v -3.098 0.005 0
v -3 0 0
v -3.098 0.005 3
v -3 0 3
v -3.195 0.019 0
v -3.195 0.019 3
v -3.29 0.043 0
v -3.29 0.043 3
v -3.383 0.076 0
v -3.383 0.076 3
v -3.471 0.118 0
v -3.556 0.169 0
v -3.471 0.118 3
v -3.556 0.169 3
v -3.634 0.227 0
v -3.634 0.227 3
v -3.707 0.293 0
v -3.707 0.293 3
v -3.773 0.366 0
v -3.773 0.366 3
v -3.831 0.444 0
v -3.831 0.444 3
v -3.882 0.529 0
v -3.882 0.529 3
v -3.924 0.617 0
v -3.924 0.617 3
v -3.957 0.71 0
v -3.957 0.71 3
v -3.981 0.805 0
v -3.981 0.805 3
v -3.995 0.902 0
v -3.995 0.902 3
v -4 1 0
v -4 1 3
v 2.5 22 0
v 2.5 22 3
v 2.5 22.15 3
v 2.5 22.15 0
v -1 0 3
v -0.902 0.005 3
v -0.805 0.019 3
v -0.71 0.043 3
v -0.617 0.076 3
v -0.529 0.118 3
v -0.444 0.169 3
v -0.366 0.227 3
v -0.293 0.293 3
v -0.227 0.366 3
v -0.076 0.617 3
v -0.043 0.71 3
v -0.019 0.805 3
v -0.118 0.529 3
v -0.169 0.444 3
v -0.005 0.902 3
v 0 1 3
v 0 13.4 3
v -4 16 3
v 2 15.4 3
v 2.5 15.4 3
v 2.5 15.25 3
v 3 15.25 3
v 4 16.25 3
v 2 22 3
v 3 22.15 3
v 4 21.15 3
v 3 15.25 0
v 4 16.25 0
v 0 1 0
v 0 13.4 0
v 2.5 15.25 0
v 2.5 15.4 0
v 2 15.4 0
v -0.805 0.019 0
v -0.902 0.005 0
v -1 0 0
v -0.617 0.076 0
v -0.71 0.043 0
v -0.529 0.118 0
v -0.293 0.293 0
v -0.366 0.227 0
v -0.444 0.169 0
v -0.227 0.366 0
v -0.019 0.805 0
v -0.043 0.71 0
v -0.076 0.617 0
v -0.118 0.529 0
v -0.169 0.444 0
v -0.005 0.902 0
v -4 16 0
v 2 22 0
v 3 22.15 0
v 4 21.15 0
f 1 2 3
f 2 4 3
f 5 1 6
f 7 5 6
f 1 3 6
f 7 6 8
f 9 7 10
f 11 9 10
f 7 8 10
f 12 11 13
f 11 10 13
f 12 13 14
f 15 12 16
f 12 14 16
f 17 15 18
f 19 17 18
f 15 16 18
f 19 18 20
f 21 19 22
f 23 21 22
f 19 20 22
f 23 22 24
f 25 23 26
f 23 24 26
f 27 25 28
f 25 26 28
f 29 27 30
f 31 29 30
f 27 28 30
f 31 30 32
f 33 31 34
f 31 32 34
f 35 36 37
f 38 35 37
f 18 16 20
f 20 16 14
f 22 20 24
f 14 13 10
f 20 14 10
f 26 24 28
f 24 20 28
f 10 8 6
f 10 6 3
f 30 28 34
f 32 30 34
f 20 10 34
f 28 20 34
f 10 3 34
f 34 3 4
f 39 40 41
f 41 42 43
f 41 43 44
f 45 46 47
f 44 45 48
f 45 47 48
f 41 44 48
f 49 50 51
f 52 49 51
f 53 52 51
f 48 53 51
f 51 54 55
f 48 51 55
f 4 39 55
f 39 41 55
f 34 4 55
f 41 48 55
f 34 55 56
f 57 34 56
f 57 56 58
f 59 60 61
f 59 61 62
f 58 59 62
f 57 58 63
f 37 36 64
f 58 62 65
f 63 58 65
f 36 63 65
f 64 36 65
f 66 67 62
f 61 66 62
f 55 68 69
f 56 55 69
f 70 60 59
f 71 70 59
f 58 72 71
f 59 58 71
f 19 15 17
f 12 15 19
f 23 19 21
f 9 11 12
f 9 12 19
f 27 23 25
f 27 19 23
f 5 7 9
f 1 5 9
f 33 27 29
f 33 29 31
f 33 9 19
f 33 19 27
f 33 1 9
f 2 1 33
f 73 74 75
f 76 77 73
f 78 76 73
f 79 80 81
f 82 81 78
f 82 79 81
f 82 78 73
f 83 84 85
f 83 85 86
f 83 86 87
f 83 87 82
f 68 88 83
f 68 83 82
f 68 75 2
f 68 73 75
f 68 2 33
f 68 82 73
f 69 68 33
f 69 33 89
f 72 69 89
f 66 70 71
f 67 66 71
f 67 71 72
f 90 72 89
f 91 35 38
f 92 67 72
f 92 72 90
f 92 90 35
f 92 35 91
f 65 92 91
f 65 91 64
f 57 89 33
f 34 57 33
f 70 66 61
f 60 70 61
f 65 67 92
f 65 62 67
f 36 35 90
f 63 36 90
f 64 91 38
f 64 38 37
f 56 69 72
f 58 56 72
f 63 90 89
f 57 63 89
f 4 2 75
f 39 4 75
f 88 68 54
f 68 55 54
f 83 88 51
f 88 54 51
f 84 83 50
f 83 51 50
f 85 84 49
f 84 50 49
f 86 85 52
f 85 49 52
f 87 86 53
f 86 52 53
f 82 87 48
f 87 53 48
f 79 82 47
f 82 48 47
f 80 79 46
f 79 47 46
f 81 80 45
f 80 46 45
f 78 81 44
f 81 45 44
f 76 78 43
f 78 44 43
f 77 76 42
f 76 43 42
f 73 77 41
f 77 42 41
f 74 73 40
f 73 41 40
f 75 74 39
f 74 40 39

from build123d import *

# Parameters (mm, degrees)
F1_DEPTH = 3
F2_W     = 0.15
F2_H     = 3
F3_DEPTH = 1.5
F4_SIZE  = 1
F5_R     = 1


with BuildPart() as f1:
    # F0 (on Top) → F1 (new body)
    with BuildSketch(Plane.XY):
        Polygon((2, 22), (-4, 16), (-4, 0), (0, 0), (0, 13.4), (2, 15.4), (4, 15.4), (4, 22), align=None)
    extrude(amount=F1_DEPTH)

    # F2 (on face) → F3 (join)
    with BuildSketch(Plane.YZ.offset(4)):
        with Locations((15.325, 1.5)):
            Rectangle(F2_W, F2_H)
        with Locations((22.075, 1.5)):
            Rectangle(F2_W, F2_H)
    extrude(amount=-F3_DEPTH)

    # F4
    f4_edges = [f1.edges().sort_by_distance(p)[0] for p in [
        (4, 15.25, 1.5),
        (4, 22.15, 1.5),
    ]]
    chamfer(f4_edges, length=F4_SIZE)

    # F5
    f5_edges = [f1.edges().sort_by_distance(p)[0] for p in [
        (0, 0, 1.5),
        (-4, 0, 1.5),
    ]]
    fillet(f5_edges, radius=F5_R)


solid = f1.part
